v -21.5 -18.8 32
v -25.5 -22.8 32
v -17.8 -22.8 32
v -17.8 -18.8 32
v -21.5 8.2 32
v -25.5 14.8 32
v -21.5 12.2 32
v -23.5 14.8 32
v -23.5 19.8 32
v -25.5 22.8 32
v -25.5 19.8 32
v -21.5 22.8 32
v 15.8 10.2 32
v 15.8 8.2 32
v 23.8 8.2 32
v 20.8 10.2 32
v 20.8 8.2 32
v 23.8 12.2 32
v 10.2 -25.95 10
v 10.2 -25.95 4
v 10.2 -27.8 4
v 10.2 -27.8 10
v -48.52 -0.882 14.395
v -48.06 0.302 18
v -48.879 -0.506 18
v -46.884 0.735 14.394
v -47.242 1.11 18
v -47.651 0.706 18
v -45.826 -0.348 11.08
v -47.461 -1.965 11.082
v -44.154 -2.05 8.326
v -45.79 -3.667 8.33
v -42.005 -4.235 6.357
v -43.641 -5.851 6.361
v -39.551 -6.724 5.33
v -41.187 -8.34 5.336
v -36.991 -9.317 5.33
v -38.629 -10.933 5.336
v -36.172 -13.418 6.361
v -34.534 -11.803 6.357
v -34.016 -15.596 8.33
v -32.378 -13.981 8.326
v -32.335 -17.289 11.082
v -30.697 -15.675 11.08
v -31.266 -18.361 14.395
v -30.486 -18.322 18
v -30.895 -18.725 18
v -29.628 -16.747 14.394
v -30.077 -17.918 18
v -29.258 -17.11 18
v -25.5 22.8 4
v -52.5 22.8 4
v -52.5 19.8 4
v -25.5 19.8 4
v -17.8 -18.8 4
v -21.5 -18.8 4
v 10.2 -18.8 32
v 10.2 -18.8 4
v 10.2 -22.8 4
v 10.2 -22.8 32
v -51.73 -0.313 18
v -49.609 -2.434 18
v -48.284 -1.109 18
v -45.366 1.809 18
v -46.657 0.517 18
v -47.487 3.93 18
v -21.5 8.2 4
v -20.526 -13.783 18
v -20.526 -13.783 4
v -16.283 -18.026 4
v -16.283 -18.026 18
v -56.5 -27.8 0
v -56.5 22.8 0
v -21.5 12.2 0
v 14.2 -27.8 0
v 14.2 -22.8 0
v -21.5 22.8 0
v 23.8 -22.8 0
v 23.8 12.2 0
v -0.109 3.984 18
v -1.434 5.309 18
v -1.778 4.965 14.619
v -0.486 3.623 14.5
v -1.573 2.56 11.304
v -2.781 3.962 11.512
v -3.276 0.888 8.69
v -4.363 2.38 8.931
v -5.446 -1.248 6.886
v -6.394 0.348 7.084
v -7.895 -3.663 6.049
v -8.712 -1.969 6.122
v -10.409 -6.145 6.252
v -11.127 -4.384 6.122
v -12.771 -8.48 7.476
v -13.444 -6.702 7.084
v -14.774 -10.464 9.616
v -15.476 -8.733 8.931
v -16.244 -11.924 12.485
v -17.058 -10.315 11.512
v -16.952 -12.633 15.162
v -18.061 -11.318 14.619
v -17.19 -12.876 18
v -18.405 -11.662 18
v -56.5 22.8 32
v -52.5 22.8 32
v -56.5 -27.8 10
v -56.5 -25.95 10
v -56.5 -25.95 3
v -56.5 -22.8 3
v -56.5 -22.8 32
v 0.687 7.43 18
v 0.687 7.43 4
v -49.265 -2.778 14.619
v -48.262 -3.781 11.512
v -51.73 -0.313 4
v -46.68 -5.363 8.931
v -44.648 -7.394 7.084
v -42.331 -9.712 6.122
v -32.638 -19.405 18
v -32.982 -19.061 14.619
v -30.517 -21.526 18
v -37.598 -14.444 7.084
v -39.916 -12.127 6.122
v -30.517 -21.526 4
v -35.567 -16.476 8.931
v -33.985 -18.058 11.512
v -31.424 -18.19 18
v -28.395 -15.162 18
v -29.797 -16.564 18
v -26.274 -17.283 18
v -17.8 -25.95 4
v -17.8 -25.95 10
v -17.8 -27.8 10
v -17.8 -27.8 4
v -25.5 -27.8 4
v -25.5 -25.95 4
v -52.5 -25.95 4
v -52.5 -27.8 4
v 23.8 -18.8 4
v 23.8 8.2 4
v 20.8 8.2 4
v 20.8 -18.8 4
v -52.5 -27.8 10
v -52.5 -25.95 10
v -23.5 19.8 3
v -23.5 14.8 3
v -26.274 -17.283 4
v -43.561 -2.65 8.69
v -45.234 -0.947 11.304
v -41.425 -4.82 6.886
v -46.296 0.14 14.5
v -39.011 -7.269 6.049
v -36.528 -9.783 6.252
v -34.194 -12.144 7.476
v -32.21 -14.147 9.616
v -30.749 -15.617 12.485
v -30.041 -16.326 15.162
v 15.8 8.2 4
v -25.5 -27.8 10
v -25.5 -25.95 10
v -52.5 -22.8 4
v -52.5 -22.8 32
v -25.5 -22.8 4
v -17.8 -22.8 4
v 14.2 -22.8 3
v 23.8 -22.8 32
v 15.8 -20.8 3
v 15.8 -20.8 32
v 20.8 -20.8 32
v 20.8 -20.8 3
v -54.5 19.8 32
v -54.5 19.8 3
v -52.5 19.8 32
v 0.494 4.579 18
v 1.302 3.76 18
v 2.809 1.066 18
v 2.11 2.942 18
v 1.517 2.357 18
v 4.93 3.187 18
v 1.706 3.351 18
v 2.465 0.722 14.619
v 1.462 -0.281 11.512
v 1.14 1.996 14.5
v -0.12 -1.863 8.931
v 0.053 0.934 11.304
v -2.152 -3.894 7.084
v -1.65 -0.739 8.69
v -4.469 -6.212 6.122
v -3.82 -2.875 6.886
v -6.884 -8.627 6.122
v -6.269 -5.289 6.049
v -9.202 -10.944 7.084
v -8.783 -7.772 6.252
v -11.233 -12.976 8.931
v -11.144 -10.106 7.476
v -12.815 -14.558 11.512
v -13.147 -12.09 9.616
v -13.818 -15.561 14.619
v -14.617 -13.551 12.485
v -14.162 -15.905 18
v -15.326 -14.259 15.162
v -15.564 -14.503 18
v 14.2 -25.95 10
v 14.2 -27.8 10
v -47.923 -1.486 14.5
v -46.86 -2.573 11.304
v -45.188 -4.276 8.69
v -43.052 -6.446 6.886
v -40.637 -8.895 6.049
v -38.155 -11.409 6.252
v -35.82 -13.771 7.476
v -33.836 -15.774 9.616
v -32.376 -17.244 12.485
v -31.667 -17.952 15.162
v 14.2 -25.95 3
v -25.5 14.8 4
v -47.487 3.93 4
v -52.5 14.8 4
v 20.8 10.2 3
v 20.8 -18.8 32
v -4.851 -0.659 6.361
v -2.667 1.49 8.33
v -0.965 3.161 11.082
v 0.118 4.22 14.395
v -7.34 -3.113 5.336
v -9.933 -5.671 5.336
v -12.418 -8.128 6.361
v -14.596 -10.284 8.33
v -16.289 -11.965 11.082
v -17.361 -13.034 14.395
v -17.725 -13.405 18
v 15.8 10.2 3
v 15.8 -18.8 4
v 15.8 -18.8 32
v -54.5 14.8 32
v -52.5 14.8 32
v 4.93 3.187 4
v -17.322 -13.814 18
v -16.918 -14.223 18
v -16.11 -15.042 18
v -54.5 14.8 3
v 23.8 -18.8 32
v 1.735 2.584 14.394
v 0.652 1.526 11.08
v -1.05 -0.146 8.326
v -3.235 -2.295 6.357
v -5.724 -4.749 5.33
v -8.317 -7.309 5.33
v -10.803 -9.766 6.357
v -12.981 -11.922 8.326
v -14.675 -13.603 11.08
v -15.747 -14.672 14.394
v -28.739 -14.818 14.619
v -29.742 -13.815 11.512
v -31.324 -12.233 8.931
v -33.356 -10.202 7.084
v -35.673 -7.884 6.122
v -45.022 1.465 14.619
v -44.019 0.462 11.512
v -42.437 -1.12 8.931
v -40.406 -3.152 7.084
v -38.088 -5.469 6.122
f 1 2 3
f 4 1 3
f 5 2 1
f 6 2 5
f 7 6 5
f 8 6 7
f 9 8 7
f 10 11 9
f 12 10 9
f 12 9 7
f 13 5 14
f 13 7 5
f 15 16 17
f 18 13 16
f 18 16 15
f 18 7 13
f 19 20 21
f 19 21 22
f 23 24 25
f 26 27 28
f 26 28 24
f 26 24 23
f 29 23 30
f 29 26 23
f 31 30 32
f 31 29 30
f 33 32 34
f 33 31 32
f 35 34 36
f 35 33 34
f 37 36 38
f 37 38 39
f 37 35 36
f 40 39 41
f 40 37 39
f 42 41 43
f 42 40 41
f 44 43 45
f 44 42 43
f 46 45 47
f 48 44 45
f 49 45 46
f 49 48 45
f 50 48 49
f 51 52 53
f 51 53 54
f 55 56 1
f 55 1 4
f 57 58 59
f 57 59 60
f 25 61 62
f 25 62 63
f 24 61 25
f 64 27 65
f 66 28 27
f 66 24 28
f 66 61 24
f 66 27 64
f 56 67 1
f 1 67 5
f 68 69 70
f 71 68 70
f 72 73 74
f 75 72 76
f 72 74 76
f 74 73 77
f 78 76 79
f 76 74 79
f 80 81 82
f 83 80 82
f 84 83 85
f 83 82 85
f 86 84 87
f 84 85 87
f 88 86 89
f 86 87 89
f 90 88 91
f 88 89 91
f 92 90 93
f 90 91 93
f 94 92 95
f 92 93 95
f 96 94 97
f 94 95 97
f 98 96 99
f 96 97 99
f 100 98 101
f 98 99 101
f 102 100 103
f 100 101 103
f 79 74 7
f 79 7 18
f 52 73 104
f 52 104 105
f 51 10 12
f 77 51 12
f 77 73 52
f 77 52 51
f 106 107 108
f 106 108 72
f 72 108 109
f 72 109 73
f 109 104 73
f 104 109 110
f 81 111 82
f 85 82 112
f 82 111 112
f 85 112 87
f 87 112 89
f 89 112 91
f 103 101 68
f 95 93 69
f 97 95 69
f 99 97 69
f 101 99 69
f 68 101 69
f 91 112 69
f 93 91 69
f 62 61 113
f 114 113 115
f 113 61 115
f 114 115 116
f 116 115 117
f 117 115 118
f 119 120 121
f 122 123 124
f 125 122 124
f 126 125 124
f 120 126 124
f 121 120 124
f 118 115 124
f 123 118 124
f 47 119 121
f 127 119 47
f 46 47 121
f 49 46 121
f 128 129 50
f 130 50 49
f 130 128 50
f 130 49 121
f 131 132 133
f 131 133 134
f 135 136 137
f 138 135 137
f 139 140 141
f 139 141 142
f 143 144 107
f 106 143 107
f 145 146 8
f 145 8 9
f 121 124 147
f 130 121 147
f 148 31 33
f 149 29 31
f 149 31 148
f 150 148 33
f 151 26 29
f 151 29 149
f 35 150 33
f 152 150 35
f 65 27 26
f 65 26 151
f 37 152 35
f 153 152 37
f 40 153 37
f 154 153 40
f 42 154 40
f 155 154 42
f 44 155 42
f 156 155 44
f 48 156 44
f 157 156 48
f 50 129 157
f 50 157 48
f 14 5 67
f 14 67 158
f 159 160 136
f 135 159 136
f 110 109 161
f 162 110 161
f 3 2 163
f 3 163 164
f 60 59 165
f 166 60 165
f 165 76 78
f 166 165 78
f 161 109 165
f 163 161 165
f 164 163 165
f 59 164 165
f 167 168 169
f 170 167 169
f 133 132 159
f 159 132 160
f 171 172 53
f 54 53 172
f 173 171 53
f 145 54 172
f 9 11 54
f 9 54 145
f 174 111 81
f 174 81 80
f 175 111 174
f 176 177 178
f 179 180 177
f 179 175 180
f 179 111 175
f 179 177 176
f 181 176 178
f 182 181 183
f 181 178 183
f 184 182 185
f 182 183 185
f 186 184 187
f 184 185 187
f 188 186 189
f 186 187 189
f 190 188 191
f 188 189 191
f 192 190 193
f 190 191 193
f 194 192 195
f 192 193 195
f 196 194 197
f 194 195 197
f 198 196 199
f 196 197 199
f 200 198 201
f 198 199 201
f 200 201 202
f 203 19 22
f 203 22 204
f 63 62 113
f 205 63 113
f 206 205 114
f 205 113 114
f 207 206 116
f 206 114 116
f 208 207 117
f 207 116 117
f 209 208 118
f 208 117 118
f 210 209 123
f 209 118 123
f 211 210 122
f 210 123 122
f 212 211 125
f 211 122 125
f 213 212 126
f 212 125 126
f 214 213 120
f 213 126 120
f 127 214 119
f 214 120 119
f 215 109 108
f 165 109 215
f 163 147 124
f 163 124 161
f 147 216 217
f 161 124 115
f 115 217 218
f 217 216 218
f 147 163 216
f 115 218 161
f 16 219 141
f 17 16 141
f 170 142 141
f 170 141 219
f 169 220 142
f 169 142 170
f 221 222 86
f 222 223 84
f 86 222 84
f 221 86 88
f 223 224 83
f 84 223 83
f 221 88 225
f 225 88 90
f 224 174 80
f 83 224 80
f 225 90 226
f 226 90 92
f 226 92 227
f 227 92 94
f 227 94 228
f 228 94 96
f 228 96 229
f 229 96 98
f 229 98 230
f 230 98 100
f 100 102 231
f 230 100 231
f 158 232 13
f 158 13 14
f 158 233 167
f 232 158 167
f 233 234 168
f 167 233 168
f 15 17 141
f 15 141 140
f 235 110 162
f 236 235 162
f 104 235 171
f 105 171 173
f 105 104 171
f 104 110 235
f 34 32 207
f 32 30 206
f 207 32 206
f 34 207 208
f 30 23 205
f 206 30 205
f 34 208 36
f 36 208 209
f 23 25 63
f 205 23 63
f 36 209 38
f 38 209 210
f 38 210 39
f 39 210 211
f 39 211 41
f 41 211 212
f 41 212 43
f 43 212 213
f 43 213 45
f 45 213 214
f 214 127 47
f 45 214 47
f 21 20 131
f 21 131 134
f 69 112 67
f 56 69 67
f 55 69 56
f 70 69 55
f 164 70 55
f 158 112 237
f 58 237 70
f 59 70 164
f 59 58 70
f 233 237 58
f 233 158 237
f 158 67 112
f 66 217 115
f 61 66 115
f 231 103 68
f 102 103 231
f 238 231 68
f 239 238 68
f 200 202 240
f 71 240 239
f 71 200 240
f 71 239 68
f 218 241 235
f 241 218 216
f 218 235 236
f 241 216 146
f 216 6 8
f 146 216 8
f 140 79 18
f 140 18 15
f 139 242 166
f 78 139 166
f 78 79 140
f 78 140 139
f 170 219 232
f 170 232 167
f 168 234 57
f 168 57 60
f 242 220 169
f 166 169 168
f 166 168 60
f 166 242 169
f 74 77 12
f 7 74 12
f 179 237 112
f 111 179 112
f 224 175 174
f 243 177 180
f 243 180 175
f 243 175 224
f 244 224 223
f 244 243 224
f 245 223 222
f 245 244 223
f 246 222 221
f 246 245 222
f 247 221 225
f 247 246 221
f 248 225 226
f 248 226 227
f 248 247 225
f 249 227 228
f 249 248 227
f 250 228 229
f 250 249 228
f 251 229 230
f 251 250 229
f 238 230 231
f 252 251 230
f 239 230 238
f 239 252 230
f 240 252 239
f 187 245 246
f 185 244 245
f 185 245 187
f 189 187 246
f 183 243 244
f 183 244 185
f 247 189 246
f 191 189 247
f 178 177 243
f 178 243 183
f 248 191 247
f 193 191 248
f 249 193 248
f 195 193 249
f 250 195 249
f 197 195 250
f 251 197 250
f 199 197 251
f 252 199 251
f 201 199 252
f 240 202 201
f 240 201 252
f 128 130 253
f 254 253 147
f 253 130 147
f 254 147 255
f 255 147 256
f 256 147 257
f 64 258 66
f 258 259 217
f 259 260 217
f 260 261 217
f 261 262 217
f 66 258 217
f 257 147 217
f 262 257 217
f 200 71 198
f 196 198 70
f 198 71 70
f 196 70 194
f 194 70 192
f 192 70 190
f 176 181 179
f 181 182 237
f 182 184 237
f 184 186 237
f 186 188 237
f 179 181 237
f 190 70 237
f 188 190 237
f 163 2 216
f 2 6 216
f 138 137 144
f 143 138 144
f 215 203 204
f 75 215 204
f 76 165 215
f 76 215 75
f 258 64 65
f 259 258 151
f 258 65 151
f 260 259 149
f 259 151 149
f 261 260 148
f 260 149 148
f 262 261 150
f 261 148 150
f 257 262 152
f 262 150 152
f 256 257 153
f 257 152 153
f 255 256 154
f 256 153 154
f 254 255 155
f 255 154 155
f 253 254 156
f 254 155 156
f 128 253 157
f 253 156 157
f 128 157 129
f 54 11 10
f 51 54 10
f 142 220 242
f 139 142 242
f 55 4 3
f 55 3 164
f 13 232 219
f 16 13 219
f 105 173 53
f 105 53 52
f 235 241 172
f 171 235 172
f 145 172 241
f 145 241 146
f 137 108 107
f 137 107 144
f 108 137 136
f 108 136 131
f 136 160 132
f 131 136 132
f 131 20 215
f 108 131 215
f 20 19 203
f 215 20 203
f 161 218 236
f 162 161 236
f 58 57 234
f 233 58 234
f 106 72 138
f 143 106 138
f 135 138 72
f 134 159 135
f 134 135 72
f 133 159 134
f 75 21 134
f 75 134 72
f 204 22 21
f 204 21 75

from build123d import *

# Parameters (mm, degrees)
CYLINDER001_R               = 12.8
CYLINDER001_DEPTH           = 2.3
CYLINDER001_ROLL_ANGLE      = 89.8666565593
CYLINDER001_PITCH_ANGLE     = -0.0557418137
CYLINDER001_PLACEMENT_ANGLE = -45.3729530145
SKETCH022_W                 = 35
SKETCH022_H                 = 45.6
PAD010_DEPTH                = 32
SKETCH023_W                 = 27
SKETCH023_H                 = 50
POCKET008_DEPTH             = 28
SKETCH024_W                 = 31
SKETCH024_H                 = 5
POCKET009_DEPTH             = 29
PAD009_DEPTH                = 14
POCKET007_DEPTH             = 6
SKETCH028_W                 = 4
SKETCH028_H                 = 28
POCKET011_DEPTH             = 28
PAD012_DEPTH                = 5
SKETCH030_W                 = 3.15
SKETCH030_H                 = 36
POCKET012_DEPTH             = 7
CUT002_PLACEMENT_ANGLE      = 90
CYLINDER_R                  = 12.8
CYLINDER_DEPTH              = 2.3
CYLINDER_ROLL_ANGLE         = 89.8666565593
CYLINDER_PITCH_ANGLE        = -0.0557418137
CYLINDER_PLACEMENT_ANGLE    = -45.3729530145
SKETCH017_W                 = 35
SKETCH017_H                 = 45.6
PAD008_DEPTH                = 32
SKETCH018_W                 = 27
SKETCH018_H                 = 50
POCKET005_DEPTH             = 28
SKETCH019_W                 = 31
SKETCH019_H                 = 5
POCKET006_DEPTH             = 29
PAD_DEPTH                   = 14
POCKET_DEPTH                = 6
PAD011_DEPTH                = 5
SKETCH027_W                 = 35
SKETCH027_H                 = 3.15
POCKET010_DEPTH             = 7


with BuildPart() as dichroicfilter02:
    # Cylinder001 → Cylinder001 (new body)
    with BuildSketch(Plane.XY):
        Circle(CYLINDER001_R)
    extrude(amount=CYLINDER001_DEPTH)


with BuildPart() as dichroicfilter02_1:
    # Cylinder001 roll: moved
    add(dichroicfilter02.part.rotate(Axis((0, 0, 0), (1, 0, 0)), CYLINDER001_ROLL_ANGLE))


with BuildPart() as dichroicfilter02_2:
    # Cylinder001 pitch: moved
    add(dichroicfilter02_1.part.rotate(Axis((0, 0, 0), (0, 1, 0)), CYLINDER001_PITCH_ANGLE))


with BuildPart() as dichroicfilter02_3:
    # Cylinder001 placement: moved
    add(dichroicfilter02_2.part.moved(Location((-38.25, -74, 18))).rotate(Axis((-38.25, -74, 18), (0, 0, 1)), CYLINDER001_PLACEMENT_ANGLE))


with BuildPart() as base02:
    # Sketch022 → Pad010 (new body)
    with BuildSketch(Plane.XY):
        Rectangle(SKETCH022_W, SKETCH022_H)
    extrude(amount=PAD010_DEPTH)

    # Sketch023 (on Face6 of Pad010) → Pocket008 (cut)
    with BuildSketch(Plane.XY.offset(32)):
        Rectangle(SKETCH023_W, SKETCH023_H)
    extrude(amount=-POCKET008_DEPTH, mode=Mode.SUBTRACT)

    # Sketch024 (on Face4 of Pocket008) → Pocket009 (cut)
    with BuildSketch(Plane.XY.offset(32)):
        with Locations((0, 17.3)):
            Rectangle(SKETCH024_W, SKETCH024_H)
    extrude(amount=-POCKET009_DEPTH, mode=Mode.SUBTRACT)

    # Sketch021 (on Face17 of Pocket009) → Pad009 (join)
    with BuildSketch(Plane.XY.offset(4)):
        Polygon((-12.73, -0.3126406871), (8.4832034356, -21.5258441227), (12.7258441227, -17.2832034356), (-8.4873593129, 3.93), align=None)
    extrude(amount=PAD009_DEPTH)

    # Sketch025 (on Face19 of Pad009) → Pocket007 (cut)
    with BuildSketch(Plane(origin=(-6.5213203436, -6.5213203436, 0), x_dir=(0.7071067812, -0.7071067812, 0), z_dir=(-0.7071067812, -0.7071067812, 0))):
        with BuildLine():
            ThreePointArc((-5.7803989746, 18), (6.2196010254, 6), (18.2196010254, 18))
            Line((-5.7803989746, 18), (18.2196010254, 18))
        make_face()
    extrude(amount=-POCKET007_DEPTH, mode=Mode.SUBTRACT)

    # Sketch028 (on Face6 of Pocket007) → Pocket011 (cut)
    with BuildSketch(Plane.XY.offset(32)):
        with Locations((15.5, -4.8)):
            Rectangle(SKETCH028_W, SKETCH028_H)
    extrude(amount=-POCKET011_DEPTH, mode=Mode.SUBTRACT)

    # Sketch029 (on Face4 of Pocket011) → Pad012 (join)
    with BuildSketch(Plane.YZ.offset(17.5)):
        Polygon((-22.8, 0), (-22.8, 10), (-18.8, 10), (-18.8, 4), (9.2, 4), (9.2, 10), (13.2, 10), (13.2, 0), align=None)
    extrude(amount=PAD012_DEPTH)

    # Sketch030 (on Face30 of Pad012) → Pocket012 (cut)
    with BuildSketch(Plane.XY.offset(10)):
        with Locations((19.075, -4.8)):
            Rectangle(SKETCH030_W, SKETCH030_H)
    extrude(amount=-POCKET012_DEPTH, mode=Mode.SUBTRACT)


with BuildPart() as base02_1:
    # Body007 placement: moved
    add(base02.part.moved(Location((-39, -66, 0))))

    # Cut002: cut DichroicFilter02
    add(dichroicfilter02_3.part, mode=Mode.SUBTRACT)


with BuildPart() as base02_2:
    # Cut002 placement: moved
    add(base02_1.part.moved(Location((67, -44.3, 0))).rotate(Axis((67, -44.3, 0), (0, 0, -1)), CUT002_PLACEMENT_ANGLE))


with BuildPart() as dichroicfilter01:
    # Cylinder → Cylinder (new body)
    with BuildSketch(Plane.XY):
        Circle(CYLINDER_R)
    extrude(amount=CYLINDER_DEPTH)


with BuildPart() as dichroicfilter01_1:
    # Cylinder roll: moved
    add(dichroicfilter01.part.rotate(Axis((0, 0, 0), (1, 0, 0)), CYLINDER_ROLL_ANGLE))


with BuildPart() as dichroicfilter01_2:
    # Cylinder pitch: moved
    add(dichroicfilter01_1.part.rotate(Axis((0, 0, 0), (0, 1, 0)), CYLINDER_PITCH_ANGLE))


with BuildPart() as dichroicfilter01_3:
    # Cylinder placement: moved
    add(dichroicfilter01_2.part.moved(Location((-38.25, -8, 18))).rotate(Axis((-38.25, -8, 18), (0, 0, 1)), CYLINDER_PLACEMENT_ANGLE))


with BuildPart() as fullbase:
    # Sketch017 → Pad008 (new body)
    with BuildSketch(Plane.XY):
        Rectangle(SKETCH017_W, SKETCH017_H)
    extrude(amount=PAD008_DEPTH)

    # Sketch018 (on Face6 of Pad008) → Pocket005 (cut)
    with BuildSketch(Plane.XY.offset(32)):
        Rectangle(SKETCH018_W, SKETCH018_H)
    extrude(amount=-POCKET005_DEPTH, mode=Mode.SUBTRACT)

    # Sketch019 (on Face4 of Pocket005) → Pocket006 (cut)
    with BuildSketch(Plane.XY.offset(32)):
        with Locations((0, 17.3)):
            Rectangle(SKETCH019_W, SKETCH019_H)
    extrude(amount=-POCKET006_DEPTH, mode=Mode.SUBTRACT)

    # Sketch (on Face17 of Pocket006) → Pad (join)
    with BuildSketch(Plane.XY.offset(4)):
        Polygon((-12.73, -0.3126406871), (8.4832034356, -21.5258441227), (12.7258441227, -17.2832034356), (-8.4873593129, 3.93), align=None)
    extrude(amount=PAD_DEPTH)

    # Sketch020 (on Face19 of Pad) → Pocket (cut)
    with BuildSketch(Plane(origin=(-6.5213203436, -6.5213203436, 0), x_dir=(0.7071067812, -0.7071067812, 0), z_dir=(-0.7071067812, -0.7071067812, 0))):
        with BuildLine():
            ThreePointArc((-5.7803989746, 18), (6.2196010254, 6), (18.2196010254, 18))
            Line((-5.7803989746, 18), (18.2196010254, 18))
        make_face()
    extrude(amount=-POCKET_DEPTH, mode=Mode.SUBTRACT)

    # Sketch026 (on Face10 of Pocket) → Pad011 (join)
    with BuildSketch(Plane.XZ.offset(22.8)):
        Polygon((-17.5, 0), (17.5, 0), (17.5, 10), (13.5, 10), (13.5, 4), (-13.5, 4), (-13.5, 10), (-17.5, 10), align=None)
    extrude(amount=PAD011_DEPTH)

    # Sketch027 (on Face22 of Pad011) → Pocket010 (cut)
    with BuildSketch(Plane.XY.offset(10)):
        with Locations((0, -24.375)):
            Rectangle(SKETCH027_W, SKETCH027_H)
    extrude(amount=-POCKET010_DEPTH, mode=Mode.SUBTRACT)


with BuildPart() as fullbase_1:
    # Body006 placement: moved
    add(fullbase.part.moved(Location((-39, 0, 0))))

    # Cut001: cut DichroicFilter01
    add(dichroicfilter01_3.part, mode=Mode.SUBTRACT)

    # Fusion: union Base02
    add(base02_2.part)


solid = fullbase_1.part
